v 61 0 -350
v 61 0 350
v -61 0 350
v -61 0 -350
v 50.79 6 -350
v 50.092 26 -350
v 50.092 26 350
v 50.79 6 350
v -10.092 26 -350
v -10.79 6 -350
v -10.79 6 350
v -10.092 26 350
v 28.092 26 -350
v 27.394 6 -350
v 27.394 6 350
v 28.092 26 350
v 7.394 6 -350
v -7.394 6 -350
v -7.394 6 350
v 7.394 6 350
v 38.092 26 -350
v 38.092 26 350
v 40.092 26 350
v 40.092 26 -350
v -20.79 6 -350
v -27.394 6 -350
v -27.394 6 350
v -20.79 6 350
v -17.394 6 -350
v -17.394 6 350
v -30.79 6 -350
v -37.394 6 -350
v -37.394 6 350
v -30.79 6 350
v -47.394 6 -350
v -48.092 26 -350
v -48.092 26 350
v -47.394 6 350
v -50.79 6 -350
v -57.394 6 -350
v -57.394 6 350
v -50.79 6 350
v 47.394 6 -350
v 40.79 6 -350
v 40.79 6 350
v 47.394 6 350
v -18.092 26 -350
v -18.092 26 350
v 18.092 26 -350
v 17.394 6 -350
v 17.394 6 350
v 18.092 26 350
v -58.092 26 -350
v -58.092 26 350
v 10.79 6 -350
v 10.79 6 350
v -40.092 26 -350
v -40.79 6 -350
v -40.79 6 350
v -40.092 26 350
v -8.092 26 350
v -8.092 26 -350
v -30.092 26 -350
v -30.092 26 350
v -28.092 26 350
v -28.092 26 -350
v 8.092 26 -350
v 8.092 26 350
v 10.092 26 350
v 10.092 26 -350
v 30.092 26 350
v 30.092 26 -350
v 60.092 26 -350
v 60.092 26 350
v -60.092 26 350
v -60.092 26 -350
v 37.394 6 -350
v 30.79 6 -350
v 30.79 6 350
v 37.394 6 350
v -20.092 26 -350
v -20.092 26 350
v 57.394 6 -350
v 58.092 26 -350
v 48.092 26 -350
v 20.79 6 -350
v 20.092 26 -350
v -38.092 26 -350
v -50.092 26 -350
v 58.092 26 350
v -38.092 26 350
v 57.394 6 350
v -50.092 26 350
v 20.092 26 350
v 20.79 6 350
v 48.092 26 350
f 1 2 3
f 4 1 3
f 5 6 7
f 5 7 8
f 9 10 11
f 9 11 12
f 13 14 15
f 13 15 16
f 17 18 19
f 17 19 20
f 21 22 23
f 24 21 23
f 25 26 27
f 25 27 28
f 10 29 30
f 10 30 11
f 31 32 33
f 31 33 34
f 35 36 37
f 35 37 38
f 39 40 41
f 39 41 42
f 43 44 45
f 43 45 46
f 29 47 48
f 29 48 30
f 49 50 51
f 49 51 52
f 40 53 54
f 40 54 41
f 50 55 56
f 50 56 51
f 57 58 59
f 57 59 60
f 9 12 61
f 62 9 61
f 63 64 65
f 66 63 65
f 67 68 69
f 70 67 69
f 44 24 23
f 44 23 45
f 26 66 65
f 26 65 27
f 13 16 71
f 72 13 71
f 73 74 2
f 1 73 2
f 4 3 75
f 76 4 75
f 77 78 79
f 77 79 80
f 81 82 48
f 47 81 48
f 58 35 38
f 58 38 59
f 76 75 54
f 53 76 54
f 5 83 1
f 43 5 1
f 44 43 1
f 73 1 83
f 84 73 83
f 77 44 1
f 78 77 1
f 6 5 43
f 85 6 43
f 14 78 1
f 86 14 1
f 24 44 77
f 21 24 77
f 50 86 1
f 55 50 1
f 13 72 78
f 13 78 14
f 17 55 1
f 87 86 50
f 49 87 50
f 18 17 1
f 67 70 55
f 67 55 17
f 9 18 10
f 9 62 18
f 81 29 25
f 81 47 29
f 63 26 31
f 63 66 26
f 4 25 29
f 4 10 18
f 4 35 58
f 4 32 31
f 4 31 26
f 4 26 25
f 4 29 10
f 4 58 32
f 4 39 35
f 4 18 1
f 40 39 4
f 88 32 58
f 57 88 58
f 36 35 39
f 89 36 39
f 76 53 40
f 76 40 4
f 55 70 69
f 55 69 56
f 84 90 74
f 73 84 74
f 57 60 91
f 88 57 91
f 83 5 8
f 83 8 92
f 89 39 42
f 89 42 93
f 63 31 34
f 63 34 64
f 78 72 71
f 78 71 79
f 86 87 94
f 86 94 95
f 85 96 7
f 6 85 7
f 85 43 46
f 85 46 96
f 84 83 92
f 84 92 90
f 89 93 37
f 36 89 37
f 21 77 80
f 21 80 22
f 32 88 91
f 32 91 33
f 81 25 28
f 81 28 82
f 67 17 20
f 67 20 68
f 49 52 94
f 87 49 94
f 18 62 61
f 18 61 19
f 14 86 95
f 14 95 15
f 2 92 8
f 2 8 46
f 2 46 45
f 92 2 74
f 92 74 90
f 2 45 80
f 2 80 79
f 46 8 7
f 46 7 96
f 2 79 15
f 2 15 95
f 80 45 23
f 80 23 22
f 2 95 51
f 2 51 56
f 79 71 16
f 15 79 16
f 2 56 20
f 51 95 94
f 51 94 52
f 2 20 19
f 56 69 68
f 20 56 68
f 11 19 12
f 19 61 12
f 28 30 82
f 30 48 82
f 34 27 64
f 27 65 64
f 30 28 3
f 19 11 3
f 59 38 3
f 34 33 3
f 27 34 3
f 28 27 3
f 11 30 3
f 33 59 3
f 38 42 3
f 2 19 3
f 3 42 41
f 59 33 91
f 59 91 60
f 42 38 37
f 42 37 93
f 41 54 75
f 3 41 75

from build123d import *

# Parameters (mm, degrees)
BOSS_EXTRUDE1_DEPTH      = 350
BOSS_EXTRUDE1_DEPTH_BACK = 350


with BuildPart() as part:
    # Sketch1 → Boss-Extrude1 (new, two sides: drawn at the far end of the back side and taken through both)
    with BuildSketch(Plane.XY.offset(-BOSS_EXTRUDE1_DEPTH_BACK)):
        Polygon((61, 0), (-61, 0), (-60.092059993, 26), (-58.092059993, 26), (-57.393644603, 6), (-50.790475383, 6), (-50.092059993, 26), (-48.092059993, 26), (-47.393644603, 6), (-40.790475383, 6), (-40.092059993, 26), (-38.092059993, 26), (-37.393644603, 6), (-30.790475383, 6), (-30.092059993, 26), (-28.092059993, 26), (-27.393644603, 6), (-20.790475383, 6), (-20.092059993, 26), (-18.092059993, 26), (-17.393644603, 6), (-10.790475383, 6), (-10.092059993, 26), (-8.092059993, 26), (-7.393644603, 6), (7.393644603, 6), (8.092059993, 26), (10.092059993, 26), (10.790475383, 6), (17.393644603, 6), (18.092059993, 26), (20.092059993, 26), (20.790475383, 6), (27.393644603, 6), (28.092059993, 26), (30.092059993, 26), (30.790475383, 6), (37.393644603, 6), (38.092059993, 26), (40.092059993, 26), (40.790475383, 6), (47.393644603, 6), (48.092059993, 26), (50.092059993, 26), (50.790475383, 6), (57.393644603, 6), (58.092059993, 26), (60.092059993, 26), align=None)
    extrude(amount=BOSS_EXTRUDE1_DEPTH + BOSS_EXTRUDE1_DEPTH_BACK)


solid = part.part
